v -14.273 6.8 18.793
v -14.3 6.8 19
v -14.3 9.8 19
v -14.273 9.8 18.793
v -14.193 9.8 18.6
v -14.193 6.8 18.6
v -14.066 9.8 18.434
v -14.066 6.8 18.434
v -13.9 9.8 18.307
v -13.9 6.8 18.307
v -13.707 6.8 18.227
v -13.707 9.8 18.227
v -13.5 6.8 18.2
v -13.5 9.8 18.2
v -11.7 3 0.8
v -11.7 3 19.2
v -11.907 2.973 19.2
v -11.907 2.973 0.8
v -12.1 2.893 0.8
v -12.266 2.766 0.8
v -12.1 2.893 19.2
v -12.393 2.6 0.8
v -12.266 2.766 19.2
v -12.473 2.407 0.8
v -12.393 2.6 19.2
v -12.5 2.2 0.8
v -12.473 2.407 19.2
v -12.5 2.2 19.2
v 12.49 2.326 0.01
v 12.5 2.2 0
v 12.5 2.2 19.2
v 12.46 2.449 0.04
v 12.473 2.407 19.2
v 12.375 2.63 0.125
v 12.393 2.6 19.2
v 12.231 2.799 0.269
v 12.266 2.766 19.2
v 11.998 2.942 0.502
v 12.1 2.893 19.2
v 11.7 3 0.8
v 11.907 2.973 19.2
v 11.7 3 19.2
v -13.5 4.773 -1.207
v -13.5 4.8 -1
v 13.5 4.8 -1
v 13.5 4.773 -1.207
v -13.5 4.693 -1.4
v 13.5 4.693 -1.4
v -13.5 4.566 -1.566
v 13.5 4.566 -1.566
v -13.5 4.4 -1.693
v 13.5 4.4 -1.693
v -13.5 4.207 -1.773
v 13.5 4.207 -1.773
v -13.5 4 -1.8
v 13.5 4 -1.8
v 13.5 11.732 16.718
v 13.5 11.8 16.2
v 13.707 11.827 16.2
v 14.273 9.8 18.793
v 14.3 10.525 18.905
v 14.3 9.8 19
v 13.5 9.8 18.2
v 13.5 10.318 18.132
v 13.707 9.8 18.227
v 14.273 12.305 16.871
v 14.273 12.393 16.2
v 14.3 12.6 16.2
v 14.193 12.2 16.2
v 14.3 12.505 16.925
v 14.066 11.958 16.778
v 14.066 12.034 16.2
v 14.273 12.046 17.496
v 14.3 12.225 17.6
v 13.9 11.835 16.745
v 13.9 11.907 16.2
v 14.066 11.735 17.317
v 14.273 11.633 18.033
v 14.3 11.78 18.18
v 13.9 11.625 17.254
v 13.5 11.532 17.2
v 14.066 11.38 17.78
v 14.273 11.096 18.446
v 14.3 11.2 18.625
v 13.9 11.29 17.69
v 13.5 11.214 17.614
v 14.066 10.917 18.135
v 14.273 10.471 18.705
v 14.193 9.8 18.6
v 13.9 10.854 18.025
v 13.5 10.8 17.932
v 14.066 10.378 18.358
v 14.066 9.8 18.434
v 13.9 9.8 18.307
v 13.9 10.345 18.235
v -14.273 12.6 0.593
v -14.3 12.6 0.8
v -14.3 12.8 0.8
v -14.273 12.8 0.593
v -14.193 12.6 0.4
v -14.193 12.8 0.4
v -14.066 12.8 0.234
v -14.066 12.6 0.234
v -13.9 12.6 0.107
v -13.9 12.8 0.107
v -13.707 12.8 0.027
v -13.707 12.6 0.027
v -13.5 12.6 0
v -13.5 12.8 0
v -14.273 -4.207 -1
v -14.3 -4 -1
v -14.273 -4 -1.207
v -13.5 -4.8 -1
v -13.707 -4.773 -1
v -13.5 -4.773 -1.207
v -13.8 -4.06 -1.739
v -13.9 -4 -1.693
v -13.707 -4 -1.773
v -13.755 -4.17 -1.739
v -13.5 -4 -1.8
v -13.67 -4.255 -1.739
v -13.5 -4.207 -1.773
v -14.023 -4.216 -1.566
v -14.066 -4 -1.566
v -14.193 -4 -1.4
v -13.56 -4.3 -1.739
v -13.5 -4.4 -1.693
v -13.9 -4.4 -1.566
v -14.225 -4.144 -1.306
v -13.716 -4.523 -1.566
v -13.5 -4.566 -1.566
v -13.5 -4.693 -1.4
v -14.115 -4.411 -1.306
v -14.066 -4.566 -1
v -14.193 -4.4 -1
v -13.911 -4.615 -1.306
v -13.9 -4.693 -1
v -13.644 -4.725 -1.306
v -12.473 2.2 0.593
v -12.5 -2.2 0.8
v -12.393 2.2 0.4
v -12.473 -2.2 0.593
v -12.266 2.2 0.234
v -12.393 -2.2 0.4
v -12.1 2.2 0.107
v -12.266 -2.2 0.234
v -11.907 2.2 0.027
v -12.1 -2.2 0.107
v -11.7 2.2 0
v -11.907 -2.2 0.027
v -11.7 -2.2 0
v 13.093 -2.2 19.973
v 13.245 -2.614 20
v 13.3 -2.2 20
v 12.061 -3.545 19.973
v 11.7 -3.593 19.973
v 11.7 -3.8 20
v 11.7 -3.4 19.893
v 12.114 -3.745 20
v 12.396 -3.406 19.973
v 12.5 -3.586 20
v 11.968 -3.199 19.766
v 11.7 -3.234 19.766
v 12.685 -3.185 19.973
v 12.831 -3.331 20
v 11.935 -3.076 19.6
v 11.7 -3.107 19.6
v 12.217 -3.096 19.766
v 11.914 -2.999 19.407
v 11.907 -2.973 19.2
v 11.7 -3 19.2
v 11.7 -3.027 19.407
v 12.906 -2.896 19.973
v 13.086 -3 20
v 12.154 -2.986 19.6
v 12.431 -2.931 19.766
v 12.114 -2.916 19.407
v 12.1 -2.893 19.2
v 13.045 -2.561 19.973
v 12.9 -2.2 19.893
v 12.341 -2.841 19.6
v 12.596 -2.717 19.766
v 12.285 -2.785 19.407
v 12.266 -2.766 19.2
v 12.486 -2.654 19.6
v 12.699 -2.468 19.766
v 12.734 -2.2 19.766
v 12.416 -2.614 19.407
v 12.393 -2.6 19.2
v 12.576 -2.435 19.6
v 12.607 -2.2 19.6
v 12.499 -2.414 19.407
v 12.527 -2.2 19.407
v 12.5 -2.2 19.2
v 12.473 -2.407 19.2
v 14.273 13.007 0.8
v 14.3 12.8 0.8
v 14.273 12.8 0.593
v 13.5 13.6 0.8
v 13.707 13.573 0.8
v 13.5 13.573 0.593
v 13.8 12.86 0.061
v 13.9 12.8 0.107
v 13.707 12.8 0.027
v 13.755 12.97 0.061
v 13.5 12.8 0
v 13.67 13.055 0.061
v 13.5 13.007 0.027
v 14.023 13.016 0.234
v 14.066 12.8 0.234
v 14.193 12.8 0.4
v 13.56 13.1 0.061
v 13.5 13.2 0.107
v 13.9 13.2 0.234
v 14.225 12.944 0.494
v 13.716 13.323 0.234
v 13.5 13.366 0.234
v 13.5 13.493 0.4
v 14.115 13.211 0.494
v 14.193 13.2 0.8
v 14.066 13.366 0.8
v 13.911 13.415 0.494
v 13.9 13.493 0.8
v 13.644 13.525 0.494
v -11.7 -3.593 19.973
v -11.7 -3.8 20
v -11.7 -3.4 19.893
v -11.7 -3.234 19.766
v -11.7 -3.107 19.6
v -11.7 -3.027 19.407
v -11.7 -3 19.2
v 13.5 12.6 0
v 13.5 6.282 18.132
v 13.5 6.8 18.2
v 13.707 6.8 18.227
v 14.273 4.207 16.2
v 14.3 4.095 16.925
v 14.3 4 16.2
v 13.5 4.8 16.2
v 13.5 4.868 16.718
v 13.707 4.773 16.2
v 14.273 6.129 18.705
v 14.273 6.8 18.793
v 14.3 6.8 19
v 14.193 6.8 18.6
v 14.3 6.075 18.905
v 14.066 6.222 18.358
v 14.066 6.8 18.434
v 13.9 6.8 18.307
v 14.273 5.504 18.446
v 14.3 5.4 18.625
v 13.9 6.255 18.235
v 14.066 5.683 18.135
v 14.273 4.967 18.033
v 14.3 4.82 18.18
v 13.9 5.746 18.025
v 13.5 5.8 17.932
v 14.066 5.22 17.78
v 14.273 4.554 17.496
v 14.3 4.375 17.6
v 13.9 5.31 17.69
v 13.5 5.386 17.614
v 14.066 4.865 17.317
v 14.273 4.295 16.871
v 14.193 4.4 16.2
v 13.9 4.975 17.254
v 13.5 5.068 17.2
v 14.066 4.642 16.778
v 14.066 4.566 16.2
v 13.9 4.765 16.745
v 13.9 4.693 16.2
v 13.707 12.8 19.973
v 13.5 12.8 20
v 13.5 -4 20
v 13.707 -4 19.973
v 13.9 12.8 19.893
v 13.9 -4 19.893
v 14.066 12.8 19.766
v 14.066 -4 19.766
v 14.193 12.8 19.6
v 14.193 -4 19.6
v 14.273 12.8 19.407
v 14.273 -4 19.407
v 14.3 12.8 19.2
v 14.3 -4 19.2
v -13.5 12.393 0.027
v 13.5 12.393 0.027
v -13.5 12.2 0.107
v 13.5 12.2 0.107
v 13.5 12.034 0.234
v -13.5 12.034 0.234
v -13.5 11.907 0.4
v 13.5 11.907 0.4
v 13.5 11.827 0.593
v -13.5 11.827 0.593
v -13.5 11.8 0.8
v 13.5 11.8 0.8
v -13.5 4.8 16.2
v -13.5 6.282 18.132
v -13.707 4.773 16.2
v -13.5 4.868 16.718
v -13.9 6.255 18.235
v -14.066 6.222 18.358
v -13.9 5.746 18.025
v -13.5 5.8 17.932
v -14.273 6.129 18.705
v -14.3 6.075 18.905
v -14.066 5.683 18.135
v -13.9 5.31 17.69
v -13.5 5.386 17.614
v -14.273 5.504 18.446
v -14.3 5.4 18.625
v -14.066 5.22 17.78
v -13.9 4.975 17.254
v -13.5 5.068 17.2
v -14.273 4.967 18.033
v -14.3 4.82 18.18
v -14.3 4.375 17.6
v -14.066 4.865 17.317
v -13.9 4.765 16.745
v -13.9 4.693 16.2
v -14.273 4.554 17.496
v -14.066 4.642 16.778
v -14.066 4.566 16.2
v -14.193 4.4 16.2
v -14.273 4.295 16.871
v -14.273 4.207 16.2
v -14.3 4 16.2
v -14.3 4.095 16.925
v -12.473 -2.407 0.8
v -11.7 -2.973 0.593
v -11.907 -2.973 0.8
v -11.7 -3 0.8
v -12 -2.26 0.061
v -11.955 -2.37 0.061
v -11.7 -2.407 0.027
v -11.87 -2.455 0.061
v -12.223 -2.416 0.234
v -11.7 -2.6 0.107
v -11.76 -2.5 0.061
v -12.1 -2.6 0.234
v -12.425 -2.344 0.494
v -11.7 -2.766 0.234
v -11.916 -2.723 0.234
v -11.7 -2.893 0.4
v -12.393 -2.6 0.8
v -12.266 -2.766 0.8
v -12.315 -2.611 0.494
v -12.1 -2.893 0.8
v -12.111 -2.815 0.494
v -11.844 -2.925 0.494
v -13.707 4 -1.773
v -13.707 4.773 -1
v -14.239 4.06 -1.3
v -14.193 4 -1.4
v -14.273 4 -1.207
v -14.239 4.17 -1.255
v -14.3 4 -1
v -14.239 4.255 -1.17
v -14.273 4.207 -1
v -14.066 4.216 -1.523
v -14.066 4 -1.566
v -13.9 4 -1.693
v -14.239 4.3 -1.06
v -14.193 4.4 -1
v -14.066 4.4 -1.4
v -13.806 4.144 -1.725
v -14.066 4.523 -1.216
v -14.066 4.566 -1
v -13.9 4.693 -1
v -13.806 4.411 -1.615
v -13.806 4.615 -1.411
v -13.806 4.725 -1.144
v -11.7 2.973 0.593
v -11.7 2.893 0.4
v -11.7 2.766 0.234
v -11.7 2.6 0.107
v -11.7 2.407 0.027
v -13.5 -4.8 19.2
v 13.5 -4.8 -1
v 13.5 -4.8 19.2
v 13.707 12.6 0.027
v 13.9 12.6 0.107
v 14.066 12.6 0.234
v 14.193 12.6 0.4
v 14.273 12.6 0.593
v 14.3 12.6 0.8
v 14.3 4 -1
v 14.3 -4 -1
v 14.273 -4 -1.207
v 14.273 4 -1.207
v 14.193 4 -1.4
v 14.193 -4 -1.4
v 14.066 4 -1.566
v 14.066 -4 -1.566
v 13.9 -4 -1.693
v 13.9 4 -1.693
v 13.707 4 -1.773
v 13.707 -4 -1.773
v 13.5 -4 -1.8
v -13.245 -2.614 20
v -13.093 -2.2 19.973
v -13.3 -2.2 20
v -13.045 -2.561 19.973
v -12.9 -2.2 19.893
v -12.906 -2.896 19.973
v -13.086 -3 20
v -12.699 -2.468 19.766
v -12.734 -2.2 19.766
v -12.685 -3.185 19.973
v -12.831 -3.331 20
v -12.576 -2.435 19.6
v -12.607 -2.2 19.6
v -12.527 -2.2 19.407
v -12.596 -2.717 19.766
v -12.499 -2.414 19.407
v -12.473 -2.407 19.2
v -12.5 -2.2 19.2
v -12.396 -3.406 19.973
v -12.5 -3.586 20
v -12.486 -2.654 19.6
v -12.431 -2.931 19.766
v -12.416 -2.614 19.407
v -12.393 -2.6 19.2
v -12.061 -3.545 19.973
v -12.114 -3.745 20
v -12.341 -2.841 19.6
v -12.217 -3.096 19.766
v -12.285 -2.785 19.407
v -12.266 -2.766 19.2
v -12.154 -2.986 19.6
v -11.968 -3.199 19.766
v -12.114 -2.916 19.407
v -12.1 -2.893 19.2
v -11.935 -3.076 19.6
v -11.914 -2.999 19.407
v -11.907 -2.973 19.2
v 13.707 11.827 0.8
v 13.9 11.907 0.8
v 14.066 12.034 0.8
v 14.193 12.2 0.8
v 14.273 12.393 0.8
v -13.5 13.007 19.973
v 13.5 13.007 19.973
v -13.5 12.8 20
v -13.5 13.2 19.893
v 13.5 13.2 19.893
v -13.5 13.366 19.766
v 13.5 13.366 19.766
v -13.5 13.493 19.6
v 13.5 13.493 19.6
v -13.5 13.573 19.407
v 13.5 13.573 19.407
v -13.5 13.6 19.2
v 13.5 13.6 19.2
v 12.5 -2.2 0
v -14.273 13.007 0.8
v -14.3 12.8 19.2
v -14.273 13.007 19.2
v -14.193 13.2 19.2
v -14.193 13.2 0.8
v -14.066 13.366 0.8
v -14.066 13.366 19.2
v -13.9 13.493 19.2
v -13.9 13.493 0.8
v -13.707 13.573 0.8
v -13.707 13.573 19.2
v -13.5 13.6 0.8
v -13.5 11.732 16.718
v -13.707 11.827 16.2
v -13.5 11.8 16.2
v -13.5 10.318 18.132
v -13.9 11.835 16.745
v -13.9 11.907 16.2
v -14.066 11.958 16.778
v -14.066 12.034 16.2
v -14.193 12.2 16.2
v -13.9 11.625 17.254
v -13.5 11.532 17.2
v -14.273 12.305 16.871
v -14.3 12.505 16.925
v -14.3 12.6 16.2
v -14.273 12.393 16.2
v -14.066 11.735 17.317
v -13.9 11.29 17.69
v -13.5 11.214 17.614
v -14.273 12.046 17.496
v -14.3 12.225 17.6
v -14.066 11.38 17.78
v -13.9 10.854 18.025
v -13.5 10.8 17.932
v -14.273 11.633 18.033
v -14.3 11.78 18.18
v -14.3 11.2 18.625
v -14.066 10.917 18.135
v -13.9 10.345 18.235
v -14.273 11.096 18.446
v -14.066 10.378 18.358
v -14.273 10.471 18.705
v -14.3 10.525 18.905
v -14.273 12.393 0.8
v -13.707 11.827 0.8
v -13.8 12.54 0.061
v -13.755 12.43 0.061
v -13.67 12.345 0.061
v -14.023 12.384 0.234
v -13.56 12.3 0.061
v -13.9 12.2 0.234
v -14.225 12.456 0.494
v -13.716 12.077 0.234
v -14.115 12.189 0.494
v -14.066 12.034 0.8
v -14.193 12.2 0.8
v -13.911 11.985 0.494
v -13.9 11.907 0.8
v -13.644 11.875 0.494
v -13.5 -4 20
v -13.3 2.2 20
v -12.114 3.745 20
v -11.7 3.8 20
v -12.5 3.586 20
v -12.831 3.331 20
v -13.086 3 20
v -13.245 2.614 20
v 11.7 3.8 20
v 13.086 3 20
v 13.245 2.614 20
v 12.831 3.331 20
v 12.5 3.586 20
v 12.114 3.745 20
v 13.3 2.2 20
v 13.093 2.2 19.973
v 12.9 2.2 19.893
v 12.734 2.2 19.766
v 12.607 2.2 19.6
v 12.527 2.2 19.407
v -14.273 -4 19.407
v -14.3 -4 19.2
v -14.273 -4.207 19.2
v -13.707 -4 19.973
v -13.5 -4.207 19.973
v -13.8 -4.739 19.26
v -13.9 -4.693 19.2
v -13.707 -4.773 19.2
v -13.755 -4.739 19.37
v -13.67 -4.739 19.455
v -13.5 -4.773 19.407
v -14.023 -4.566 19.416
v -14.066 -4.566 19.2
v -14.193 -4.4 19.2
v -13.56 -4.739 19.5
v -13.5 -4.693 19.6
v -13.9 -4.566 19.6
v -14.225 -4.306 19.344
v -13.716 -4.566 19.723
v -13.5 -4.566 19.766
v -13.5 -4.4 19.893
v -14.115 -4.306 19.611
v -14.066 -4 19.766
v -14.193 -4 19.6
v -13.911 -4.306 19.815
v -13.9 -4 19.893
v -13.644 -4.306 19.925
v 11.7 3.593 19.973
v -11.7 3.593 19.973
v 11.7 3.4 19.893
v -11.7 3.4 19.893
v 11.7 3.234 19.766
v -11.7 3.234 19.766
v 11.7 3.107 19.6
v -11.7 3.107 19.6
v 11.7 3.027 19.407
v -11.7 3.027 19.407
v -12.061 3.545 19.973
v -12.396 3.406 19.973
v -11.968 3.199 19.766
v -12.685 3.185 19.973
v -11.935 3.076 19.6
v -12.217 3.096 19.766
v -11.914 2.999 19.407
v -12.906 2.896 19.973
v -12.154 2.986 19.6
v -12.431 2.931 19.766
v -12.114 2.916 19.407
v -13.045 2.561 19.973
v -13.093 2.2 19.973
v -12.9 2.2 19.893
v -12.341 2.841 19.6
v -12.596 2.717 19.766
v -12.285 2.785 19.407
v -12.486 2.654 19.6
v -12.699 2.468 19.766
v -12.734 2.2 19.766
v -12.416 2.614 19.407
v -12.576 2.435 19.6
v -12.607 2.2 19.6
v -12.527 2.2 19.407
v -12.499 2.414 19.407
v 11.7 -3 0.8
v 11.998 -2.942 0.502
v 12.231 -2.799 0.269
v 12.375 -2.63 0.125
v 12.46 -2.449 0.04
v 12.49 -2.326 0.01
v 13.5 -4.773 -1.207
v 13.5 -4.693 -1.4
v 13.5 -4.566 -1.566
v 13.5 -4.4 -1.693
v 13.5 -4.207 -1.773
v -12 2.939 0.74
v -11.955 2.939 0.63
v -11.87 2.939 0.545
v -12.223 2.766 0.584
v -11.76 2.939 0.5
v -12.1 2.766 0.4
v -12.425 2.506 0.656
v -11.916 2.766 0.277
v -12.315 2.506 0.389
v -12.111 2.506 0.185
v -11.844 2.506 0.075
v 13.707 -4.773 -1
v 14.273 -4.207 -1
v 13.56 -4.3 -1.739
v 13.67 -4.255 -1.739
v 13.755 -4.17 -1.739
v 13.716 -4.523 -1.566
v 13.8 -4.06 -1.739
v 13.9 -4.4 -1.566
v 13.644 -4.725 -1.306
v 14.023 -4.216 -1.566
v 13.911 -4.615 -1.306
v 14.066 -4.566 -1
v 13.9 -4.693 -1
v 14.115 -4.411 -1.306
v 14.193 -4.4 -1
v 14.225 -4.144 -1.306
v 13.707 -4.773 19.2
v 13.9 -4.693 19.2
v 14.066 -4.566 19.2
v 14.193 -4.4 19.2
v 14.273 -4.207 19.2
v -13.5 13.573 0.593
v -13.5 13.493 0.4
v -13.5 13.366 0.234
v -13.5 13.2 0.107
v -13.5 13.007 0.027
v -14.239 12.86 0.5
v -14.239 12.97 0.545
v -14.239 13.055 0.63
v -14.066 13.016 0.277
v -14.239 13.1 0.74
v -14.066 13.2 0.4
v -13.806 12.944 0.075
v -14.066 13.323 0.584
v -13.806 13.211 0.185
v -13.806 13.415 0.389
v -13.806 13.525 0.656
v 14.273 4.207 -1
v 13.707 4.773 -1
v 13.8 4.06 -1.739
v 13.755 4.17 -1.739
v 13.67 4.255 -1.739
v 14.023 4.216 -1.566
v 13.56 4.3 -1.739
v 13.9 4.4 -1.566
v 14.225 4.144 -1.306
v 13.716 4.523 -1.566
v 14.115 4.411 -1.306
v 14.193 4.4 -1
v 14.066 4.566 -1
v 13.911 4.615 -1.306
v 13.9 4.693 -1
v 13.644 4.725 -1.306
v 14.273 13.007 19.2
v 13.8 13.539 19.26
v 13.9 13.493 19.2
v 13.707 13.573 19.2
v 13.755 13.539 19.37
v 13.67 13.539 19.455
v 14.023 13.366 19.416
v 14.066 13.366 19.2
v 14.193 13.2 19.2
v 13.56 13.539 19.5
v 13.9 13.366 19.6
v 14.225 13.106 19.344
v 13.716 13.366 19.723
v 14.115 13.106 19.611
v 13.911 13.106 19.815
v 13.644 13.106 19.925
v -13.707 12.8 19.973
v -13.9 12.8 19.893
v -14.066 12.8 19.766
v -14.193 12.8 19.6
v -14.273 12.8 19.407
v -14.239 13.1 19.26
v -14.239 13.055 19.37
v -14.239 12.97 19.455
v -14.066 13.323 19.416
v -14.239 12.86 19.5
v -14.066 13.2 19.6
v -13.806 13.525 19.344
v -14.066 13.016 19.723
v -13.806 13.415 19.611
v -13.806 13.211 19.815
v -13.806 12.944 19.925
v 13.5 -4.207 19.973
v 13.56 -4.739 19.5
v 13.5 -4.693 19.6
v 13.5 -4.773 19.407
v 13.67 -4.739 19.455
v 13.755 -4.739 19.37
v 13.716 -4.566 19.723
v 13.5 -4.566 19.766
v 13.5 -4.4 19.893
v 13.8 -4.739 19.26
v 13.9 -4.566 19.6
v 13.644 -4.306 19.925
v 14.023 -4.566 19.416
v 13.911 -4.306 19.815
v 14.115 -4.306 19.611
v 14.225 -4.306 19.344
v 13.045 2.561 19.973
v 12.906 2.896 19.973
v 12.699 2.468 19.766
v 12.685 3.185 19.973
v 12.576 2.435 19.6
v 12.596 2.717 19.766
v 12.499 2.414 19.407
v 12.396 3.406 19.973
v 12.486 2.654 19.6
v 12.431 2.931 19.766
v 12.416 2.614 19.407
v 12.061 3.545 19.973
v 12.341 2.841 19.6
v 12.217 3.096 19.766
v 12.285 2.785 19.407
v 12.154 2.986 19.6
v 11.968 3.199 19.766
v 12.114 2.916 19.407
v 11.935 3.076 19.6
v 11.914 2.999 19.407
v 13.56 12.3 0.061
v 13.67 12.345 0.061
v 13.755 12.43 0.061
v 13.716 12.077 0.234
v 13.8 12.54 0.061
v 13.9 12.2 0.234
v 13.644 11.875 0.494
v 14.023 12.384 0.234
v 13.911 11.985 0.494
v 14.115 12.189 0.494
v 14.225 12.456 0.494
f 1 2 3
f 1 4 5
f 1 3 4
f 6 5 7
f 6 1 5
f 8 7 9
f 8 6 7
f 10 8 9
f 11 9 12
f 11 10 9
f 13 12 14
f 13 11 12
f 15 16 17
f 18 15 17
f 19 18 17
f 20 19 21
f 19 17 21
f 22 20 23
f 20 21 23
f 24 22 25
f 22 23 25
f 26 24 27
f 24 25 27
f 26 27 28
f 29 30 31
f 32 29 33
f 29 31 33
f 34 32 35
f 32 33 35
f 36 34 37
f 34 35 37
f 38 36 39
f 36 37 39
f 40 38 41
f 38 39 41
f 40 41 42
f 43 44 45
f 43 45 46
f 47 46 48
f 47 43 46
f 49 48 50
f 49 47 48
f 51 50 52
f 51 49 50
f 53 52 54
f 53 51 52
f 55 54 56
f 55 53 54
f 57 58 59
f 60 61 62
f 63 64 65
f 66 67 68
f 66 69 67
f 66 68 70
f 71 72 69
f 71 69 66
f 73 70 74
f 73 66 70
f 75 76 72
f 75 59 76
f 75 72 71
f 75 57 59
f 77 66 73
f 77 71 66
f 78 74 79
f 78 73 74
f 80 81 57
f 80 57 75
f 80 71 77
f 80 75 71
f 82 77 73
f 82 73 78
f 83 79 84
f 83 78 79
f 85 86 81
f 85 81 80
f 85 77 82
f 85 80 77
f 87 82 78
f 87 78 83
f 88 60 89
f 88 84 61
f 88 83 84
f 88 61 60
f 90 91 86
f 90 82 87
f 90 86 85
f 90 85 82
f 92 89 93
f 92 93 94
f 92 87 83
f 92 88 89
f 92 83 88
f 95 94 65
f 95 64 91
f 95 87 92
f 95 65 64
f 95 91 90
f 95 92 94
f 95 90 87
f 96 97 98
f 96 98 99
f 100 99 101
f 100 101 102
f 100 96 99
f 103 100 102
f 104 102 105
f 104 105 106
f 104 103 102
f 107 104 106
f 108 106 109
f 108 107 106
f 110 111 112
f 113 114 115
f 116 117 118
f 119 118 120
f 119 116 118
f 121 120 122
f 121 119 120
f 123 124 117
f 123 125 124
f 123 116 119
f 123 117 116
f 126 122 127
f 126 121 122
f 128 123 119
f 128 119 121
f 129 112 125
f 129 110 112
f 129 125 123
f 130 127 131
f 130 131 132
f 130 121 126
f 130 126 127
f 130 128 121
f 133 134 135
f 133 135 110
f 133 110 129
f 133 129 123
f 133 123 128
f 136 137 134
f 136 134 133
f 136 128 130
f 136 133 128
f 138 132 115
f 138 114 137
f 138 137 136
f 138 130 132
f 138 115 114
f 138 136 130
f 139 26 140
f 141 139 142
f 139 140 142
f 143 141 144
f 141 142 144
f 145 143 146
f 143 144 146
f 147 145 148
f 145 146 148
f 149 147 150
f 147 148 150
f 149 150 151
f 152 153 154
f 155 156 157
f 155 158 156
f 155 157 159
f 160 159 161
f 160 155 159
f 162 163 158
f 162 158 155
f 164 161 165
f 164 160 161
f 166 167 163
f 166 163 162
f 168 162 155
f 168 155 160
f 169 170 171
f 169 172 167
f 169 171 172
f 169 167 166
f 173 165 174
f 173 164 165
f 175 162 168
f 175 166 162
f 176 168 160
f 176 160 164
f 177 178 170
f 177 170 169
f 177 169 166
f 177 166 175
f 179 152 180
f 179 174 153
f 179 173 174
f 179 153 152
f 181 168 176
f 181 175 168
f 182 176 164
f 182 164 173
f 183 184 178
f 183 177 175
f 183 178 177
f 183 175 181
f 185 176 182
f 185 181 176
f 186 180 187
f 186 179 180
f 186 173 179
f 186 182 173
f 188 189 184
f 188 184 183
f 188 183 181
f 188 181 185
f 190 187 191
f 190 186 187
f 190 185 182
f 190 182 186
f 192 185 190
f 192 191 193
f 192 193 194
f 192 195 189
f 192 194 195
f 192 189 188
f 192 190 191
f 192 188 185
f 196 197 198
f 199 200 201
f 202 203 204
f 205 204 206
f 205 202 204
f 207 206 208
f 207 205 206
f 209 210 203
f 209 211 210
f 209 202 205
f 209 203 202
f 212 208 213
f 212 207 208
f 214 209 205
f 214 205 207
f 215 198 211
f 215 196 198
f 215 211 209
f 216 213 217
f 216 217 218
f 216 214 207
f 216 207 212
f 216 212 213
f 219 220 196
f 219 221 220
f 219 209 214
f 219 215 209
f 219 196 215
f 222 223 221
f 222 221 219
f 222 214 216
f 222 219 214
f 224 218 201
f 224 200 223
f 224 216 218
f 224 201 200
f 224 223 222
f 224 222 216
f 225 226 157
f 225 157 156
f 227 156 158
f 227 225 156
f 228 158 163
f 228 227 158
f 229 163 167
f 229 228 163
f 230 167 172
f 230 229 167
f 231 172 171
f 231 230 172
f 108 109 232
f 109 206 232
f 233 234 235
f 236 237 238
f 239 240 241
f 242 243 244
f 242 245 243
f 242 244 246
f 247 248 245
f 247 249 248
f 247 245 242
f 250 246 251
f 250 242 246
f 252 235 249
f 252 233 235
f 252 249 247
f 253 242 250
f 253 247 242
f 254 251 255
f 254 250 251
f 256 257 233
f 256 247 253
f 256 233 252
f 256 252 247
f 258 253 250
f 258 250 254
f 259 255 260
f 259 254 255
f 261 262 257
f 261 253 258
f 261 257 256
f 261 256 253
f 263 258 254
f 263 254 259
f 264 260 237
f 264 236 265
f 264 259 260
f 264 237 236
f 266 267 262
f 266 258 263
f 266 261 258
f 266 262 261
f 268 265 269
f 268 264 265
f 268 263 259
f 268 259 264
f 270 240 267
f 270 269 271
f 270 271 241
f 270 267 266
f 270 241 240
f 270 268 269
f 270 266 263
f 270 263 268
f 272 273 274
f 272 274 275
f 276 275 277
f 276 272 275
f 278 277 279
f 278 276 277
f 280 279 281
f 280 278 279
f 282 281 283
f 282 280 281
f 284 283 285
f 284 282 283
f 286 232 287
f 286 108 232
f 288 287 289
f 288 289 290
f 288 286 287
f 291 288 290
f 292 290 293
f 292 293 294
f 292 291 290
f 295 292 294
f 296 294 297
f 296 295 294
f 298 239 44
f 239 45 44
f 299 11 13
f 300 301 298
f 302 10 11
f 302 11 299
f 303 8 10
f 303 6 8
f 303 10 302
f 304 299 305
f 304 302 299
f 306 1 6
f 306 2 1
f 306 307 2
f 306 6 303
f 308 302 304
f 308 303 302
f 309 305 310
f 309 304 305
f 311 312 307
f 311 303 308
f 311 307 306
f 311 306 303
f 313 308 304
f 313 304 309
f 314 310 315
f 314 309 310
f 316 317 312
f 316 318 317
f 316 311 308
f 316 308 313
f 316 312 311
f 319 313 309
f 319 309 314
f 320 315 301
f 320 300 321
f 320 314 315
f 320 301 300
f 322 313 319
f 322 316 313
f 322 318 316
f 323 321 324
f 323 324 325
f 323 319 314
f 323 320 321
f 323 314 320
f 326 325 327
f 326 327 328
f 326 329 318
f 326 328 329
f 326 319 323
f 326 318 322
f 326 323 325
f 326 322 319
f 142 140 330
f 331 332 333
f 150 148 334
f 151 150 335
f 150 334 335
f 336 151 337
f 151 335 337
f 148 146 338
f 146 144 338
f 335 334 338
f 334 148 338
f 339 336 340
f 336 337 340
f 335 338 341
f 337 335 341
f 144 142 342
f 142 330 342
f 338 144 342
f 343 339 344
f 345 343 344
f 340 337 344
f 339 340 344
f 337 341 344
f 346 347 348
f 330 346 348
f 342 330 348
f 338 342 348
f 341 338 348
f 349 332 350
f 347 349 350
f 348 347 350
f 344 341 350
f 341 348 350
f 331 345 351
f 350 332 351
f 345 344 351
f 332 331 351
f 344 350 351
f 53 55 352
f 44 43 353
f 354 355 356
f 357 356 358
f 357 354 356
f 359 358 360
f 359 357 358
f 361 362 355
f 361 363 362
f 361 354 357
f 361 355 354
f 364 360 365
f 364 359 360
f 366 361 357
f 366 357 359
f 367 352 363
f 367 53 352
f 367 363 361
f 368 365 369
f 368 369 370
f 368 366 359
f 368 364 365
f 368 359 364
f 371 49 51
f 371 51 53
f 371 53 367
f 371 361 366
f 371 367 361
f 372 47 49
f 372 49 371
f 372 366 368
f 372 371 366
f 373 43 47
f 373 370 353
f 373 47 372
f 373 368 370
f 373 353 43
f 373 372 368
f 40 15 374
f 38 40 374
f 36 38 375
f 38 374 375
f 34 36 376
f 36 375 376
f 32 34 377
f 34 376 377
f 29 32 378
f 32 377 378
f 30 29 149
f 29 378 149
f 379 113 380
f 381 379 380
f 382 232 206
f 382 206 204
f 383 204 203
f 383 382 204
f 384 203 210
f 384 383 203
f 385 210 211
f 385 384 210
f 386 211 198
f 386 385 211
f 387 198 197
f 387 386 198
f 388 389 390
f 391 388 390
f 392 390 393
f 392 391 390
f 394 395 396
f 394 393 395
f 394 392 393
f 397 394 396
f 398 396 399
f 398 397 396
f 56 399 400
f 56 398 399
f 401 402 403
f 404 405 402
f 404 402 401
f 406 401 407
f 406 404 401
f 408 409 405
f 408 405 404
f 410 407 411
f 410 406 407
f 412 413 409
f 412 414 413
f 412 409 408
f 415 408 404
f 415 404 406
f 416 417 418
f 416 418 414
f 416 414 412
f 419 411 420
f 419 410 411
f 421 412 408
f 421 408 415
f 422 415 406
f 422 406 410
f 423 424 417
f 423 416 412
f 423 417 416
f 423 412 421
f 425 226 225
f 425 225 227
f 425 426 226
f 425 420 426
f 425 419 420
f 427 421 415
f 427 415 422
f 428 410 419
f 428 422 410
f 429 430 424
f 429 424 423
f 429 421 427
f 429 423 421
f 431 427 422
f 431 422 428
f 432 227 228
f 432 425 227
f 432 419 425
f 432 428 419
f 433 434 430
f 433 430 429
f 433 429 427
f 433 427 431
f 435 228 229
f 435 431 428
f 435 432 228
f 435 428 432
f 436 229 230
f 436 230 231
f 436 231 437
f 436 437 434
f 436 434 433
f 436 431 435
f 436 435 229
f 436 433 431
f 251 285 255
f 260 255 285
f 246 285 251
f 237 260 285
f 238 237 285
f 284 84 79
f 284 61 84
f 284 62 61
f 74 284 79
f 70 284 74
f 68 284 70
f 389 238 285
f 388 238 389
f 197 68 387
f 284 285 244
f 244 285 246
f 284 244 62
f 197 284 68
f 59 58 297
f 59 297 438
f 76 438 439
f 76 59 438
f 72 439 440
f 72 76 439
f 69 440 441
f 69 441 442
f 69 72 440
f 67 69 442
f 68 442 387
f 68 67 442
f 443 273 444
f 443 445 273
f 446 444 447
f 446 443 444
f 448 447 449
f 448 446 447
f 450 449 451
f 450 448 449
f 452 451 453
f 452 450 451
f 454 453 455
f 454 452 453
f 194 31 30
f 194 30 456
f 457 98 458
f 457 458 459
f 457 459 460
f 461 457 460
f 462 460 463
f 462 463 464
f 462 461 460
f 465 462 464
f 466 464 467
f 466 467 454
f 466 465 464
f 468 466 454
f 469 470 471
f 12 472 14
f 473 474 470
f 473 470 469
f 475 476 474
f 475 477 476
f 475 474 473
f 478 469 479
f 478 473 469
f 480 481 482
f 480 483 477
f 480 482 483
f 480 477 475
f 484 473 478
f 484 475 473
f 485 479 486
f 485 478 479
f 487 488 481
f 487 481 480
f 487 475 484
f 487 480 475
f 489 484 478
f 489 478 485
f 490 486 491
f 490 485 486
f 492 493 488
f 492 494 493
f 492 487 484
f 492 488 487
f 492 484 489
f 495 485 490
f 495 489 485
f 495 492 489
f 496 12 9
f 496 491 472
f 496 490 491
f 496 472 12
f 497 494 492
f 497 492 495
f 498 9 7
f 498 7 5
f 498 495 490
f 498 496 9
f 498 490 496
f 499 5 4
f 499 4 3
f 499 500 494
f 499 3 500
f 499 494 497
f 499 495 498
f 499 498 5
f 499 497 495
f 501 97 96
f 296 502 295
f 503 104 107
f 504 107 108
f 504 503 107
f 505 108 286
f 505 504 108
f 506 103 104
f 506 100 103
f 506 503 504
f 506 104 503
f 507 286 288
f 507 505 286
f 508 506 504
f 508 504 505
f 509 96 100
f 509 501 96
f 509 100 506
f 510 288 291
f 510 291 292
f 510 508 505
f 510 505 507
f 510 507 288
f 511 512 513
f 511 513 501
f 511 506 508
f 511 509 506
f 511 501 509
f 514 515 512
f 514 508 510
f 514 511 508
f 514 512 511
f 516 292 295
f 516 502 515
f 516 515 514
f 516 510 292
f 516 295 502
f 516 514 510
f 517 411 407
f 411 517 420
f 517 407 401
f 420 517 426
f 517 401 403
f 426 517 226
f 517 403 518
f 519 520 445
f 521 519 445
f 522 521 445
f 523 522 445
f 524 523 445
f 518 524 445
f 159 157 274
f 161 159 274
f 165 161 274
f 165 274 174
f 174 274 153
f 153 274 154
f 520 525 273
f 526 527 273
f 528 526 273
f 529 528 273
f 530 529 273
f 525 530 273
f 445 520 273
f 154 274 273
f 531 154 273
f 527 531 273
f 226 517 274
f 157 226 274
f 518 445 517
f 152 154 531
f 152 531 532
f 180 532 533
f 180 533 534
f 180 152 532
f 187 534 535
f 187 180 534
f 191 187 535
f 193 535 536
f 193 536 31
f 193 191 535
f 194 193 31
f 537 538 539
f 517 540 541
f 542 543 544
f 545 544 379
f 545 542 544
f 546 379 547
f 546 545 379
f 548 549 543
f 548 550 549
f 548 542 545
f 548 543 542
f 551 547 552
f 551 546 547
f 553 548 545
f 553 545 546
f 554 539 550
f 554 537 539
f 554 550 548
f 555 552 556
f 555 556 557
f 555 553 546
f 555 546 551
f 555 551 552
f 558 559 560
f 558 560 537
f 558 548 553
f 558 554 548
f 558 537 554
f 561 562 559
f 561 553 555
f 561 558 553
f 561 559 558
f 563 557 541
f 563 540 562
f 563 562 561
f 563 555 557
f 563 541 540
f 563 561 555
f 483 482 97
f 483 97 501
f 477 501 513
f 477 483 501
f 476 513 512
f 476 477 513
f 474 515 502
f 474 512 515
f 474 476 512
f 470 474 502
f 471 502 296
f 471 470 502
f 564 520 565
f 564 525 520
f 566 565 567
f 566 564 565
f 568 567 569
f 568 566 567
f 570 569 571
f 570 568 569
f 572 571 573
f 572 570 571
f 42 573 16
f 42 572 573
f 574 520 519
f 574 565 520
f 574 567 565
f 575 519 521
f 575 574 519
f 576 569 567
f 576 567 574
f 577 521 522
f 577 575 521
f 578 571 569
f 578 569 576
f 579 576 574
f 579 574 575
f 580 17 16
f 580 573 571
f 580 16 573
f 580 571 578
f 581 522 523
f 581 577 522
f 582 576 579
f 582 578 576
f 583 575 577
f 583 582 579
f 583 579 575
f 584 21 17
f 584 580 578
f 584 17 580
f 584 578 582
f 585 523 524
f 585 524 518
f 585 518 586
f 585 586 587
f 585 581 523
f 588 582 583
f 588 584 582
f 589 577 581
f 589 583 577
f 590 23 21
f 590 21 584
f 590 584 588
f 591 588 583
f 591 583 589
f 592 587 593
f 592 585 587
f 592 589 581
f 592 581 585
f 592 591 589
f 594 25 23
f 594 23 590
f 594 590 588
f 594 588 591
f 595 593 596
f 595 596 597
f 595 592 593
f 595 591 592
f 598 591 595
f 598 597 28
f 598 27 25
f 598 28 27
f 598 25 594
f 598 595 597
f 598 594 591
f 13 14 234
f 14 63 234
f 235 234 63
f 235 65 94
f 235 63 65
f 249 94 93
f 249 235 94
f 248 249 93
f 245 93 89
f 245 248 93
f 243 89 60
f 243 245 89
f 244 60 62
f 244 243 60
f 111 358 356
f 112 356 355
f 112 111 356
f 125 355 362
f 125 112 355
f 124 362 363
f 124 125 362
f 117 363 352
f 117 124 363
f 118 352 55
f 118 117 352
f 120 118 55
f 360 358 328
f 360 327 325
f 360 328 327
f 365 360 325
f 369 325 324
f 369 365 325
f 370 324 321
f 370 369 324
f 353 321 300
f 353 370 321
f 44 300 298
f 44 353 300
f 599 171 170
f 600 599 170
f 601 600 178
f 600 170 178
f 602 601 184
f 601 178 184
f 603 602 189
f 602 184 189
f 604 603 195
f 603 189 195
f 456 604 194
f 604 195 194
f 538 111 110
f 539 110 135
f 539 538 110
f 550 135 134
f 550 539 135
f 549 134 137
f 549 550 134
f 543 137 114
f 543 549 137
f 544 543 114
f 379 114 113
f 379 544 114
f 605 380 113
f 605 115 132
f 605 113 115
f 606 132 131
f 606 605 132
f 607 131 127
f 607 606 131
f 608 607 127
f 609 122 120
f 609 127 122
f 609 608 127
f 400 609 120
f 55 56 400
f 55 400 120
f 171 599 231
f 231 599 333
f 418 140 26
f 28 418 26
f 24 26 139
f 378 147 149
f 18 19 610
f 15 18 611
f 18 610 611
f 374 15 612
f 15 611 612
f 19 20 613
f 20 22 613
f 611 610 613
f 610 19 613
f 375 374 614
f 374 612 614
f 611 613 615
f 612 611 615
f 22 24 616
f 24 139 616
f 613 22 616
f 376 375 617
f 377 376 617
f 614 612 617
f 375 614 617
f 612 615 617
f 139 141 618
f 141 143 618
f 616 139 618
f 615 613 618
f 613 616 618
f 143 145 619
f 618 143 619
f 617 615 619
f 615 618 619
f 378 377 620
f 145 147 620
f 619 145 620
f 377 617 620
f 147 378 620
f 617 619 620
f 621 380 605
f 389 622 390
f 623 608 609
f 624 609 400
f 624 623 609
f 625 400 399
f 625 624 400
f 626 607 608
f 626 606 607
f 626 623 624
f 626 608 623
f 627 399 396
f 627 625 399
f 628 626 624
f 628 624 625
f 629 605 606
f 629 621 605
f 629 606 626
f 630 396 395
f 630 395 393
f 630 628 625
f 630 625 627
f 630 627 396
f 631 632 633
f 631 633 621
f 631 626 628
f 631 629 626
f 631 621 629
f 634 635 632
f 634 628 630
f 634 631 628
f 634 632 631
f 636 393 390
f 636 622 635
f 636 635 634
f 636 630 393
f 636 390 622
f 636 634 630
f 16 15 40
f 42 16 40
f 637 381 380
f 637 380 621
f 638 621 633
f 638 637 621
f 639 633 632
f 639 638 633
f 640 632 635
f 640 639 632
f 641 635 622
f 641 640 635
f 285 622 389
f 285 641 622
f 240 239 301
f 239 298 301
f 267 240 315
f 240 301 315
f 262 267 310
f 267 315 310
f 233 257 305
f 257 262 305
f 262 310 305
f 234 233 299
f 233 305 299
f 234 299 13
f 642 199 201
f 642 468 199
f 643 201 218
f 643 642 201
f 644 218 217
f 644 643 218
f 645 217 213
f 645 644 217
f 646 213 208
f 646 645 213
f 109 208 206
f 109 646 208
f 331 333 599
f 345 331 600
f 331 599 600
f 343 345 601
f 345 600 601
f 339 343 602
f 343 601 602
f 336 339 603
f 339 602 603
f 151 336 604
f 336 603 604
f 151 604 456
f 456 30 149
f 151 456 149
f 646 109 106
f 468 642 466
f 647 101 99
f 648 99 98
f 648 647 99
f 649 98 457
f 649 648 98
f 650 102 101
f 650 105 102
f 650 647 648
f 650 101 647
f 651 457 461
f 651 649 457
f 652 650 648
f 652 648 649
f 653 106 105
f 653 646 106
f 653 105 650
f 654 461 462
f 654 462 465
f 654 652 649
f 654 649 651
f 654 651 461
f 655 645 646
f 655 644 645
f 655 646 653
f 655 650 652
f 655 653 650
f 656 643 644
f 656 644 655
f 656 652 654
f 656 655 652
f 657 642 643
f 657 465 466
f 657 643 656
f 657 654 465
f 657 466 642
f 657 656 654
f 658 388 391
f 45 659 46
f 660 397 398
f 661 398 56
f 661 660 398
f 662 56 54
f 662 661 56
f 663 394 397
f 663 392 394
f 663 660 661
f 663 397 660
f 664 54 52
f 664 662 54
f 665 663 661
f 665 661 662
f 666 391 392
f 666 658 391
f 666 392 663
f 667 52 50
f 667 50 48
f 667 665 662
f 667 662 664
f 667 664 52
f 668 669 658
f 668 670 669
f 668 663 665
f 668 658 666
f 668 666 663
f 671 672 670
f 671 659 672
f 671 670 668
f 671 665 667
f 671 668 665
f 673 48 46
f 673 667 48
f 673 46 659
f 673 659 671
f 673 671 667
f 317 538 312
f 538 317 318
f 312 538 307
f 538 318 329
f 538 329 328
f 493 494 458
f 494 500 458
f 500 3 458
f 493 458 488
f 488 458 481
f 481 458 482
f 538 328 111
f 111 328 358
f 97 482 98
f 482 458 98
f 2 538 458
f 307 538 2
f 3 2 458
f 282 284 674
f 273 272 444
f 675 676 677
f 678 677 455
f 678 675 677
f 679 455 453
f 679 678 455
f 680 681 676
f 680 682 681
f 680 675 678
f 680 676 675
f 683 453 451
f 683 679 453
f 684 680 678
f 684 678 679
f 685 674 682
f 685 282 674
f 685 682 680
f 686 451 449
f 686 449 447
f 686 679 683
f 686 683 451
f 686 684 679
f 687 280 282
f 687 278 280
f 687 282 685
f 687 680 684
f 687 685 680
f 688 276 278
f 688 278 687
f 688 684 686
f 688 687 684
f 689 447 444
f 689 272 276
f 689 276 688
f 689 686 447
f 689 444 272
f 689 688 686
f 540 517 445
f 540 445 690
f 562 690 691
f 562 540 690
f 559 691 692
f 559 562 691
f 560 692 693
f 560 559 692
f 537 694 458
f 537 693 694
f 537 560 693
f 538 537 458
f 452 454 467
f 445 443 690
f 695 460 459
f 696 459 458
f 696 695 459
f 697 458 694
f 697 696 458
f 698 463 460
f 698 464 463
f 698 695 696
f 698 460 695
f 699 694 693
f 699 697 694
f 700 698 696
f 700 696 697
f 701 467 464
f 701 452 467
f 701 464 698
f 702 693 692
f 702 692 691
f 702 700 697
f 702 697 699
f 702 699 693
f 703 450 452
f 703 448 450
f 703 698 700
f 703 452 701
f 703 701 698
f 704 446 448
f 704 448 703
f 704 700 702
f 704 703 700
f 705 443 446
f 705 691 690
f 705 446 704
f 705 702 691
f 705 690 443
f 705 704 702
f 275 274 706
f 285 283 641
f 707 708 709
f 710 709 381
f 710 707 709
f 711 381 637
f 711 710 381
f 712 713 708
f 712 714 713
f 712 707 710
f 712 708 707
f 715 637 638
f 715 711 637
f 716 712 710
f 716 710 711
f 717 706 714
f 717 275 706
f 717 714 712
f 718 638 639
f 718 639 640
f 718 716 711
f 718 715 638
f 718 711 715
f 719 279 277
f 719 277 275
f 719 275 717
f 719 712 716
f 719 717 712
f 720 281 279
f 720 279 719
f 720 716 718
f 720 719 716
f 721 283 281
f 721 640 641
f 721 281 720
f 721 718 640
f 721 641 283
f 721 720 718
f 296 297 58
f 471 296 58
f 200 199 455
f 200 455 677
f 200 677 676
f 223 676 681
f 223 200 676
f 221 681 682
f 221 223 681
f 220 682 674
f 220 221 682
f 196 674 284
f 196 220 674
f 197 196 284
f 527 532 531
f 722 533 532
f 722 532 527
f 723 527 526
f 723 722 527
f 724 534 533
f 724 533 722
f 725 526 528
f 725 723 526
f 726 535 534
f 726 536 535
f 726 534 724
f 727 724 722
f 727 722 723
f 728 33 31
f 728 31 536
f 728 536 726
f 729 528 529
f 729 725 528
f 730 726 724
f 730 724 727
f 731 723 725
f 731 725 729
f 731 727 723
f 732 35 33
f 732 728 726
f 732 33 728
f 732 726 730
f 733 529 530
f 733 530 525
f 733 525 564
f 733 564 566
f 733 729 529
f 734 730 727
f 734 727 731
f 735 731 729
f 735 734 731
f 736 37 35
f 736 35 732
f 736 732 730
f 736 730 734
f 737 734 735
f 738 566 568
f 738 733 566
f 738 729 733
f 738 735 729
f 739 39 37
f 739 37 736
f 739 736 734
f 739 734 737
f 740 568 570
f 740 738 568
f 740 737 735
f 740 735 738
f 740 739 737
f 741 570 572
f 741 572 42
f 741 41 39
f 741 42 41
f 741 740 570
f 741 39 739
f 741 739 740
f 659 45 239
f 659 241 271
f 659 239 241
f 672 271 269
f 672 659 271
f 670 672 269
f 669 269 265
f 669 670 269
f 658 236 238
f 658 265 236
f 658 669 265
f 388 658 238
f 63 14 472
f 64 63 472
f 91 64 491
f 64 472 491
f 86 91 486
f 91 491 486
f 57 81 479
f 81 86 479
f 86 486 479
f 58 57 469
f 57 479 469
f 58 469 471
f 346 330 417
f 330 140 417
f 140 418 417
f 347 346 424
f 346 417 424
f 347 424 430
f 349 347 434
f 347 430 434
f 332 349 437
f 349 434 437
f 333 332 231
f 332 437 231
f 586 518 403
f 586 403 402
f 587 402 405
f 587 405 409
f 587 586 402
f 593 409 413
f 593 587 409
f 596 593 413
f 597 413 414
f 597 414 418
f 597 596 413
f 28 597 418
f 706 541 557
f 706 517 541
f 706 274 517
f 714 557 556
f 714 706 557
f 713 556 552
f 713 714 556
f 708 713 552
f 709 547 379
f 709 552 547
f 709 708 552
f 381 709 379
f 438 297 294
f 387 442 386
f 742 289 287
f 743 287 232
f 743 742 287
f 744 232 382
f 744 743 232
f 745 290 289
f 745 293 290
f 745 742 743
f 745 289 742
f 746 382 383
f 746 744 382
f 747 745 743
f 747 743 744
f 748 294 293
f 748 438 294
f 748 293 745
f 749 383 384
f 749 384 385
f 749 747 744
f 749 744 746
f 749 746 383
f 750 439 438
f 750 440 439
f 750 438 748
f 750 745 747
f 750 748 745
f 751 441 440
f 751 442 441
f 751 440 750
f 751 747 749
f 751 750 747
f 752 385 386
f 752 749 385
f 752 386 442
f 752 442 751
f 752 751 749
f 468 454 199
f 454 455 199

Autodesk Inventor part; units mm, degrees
ref_plane "YZ Plane" through (0, 0, 0) normal (1, 0, 0) x (0, 1, 0)
ref_plane "XZ Plane" through (0, 0, 0) normal (0, 1, 0) x (-1, 0, 0)
ref_plane "XY Plane" through (0, 0, 0) normal (0, 0, 1) x (1, 0, 0)
sketch "Sketch1" plane through (0, 0, 0) normal (0, 0, 1) x (1, 0, 0)
  line L0 (-20.02, 0) -> (20.02, 0) projected
  line L1 (0, -8.48) -> (0, 17.28) projected
  line L2 (-12.5, 3) -> (12.5, 3)
  line L3 (12.5, 3) -> (12.5, -3)
  line L4 (12.5, -3) -> (-12.5, -3)
  line L5 (-12.5, -3) -> (-12.5, 3)
  line L6 (14.3, 4.8) -> (-14.3, 4.8)
  line L7 (-14.3, 4.8) -> (-14.3, -4.8)
  line L8 (-14.3, -4.8) -> (14.3, -4.8)
  line L9 (14.3, -4.8) -> (14.3, 4.8)
  point P0 (0, 0)
  dimension "d0" = 1.8
  dimension "d1" = 25
  dimension "d2" = 6
extrude "Extrusion1" add sketch "Sketch1" along normal blind 20 contours L7 L6 L1 L2 L5 L0 | L0 L5 L4 L1 L8 L7 | L6 L9 L0 L3 L2 L1 | L1 L4 L3 L0 L9 L8
ref_plane "Work Plane1" through (0, 0, -1.8) normal (0, 0, -1) x (-1, 0, 0)
sketch "Sketch3" plane through (0, 0, -1.8) normal (0, 0, -1) x (-1, 0, 0)
  line L0 (-14.3, -4.8) -> (-14.3, 4.8) projected
  line L1 (-12.5, -3) -> (-12.5, 3) projected
  line L2 (-12.5, 3) -> (12.5, 3) projected
  line L3 (12.5, 3) -> (12.5, -3) projected
  line L4 (12.5, -3) -> (-12.5, -3) projected
  line L5 (-14.3, 4.8) -> (14.3, 4.8) projected
  line L6 (-14.3, -4.8) -> (-14.3, 4.8) projected
  line L7 (14.3, -4.8) -> (-14.3, -4.8) projected
  line L8 (14.3, 4.8) -> (14.3, -4.8) projected
  point P0 (0, 0)
extrude "Extrusion2" add sketch "Sketch3" against normal blind 1.8 contours L0 L5 L8 L7 | L1 L2 L3 L4
sketch "Sketch2" plane through (14.3, -4.8, 0) normal (1, 0, 0) x (0, 0, -1)
  line L0 (0, 1.8) -> (-20, 1.8) projected
  line L1 (1.8, 9.6) -> (-20, 9.6) projected
  line L2 (-20, 0) -> (-20, 9.6) projected
  line L3 (1.8, 0) -> (-20, 0) projected
  line L4 (-20, 9.6) -> (-20, 18.4)
  line L5 (-20, 18.4) -> (0, 18.4)
  line L6 (0, 18.4) -> (0, 16.6)
  line L7 (0, 16.6) -> (-18.2, 16.6)
  line L8 (-18.2, 16.6) -> (-18.2, 9.6)
  line L9 (1.8, 9.6) -> (1.8, 0) projected
  point P0 (0, 4.8)
  dimension "d5" = 1.8
  dimension "d6" = 1.8
  dimension "d7" = 7
extrude "Extrusion3" add sketch "Sketch2" against normal blind 28.6 contours L1 L4 L5 L6 L7 L8
fillet "Fillet1" radius 2 2 edges at (0, 4.8, 18.2) (0, 11.8, 18.2)
fillet "Fillet2" radius 0.8 33 edges at (14.3, 4.4, 20) (14.3, 13.6, 10) (14.3, 8.3, 18.2) (14.3, 11.8, 8.1) (14.3, 4.8, 7.2) (14.3, -4.8, 9.1) (14.3, 0, -1.8) (0, 4.8, -1.8) (-14.3, 8.3, 18.2) (-14.3, 11.8, 8.1) (-14.3, 4.8, 7.2) (0, 11.8, 0) (14.3, 12.7, 0) (0, 13.6, 0) (-14.3, 12.7, 0) (0, 13.6, 20) (-14.3, 13.6, 10) (-14.3, 4.4, 20) (0, -4.8, 20) (-14.3, -4.8, 9.1) (0, -4.8, -1.8) (-14.3, 0, -1.8) (0, -3, 20) (12.5, 0, 20) (0, 3, 20) (-12.5, 0, 20) (-12.5, -3, 10) (0, -3, 0) (-12.5, 0, 0) (-12.5, 3, 10) (0, 3, 0) (12.5, -3, 10) (12.5, 3, 10)
properties part number "sd.adapter"
